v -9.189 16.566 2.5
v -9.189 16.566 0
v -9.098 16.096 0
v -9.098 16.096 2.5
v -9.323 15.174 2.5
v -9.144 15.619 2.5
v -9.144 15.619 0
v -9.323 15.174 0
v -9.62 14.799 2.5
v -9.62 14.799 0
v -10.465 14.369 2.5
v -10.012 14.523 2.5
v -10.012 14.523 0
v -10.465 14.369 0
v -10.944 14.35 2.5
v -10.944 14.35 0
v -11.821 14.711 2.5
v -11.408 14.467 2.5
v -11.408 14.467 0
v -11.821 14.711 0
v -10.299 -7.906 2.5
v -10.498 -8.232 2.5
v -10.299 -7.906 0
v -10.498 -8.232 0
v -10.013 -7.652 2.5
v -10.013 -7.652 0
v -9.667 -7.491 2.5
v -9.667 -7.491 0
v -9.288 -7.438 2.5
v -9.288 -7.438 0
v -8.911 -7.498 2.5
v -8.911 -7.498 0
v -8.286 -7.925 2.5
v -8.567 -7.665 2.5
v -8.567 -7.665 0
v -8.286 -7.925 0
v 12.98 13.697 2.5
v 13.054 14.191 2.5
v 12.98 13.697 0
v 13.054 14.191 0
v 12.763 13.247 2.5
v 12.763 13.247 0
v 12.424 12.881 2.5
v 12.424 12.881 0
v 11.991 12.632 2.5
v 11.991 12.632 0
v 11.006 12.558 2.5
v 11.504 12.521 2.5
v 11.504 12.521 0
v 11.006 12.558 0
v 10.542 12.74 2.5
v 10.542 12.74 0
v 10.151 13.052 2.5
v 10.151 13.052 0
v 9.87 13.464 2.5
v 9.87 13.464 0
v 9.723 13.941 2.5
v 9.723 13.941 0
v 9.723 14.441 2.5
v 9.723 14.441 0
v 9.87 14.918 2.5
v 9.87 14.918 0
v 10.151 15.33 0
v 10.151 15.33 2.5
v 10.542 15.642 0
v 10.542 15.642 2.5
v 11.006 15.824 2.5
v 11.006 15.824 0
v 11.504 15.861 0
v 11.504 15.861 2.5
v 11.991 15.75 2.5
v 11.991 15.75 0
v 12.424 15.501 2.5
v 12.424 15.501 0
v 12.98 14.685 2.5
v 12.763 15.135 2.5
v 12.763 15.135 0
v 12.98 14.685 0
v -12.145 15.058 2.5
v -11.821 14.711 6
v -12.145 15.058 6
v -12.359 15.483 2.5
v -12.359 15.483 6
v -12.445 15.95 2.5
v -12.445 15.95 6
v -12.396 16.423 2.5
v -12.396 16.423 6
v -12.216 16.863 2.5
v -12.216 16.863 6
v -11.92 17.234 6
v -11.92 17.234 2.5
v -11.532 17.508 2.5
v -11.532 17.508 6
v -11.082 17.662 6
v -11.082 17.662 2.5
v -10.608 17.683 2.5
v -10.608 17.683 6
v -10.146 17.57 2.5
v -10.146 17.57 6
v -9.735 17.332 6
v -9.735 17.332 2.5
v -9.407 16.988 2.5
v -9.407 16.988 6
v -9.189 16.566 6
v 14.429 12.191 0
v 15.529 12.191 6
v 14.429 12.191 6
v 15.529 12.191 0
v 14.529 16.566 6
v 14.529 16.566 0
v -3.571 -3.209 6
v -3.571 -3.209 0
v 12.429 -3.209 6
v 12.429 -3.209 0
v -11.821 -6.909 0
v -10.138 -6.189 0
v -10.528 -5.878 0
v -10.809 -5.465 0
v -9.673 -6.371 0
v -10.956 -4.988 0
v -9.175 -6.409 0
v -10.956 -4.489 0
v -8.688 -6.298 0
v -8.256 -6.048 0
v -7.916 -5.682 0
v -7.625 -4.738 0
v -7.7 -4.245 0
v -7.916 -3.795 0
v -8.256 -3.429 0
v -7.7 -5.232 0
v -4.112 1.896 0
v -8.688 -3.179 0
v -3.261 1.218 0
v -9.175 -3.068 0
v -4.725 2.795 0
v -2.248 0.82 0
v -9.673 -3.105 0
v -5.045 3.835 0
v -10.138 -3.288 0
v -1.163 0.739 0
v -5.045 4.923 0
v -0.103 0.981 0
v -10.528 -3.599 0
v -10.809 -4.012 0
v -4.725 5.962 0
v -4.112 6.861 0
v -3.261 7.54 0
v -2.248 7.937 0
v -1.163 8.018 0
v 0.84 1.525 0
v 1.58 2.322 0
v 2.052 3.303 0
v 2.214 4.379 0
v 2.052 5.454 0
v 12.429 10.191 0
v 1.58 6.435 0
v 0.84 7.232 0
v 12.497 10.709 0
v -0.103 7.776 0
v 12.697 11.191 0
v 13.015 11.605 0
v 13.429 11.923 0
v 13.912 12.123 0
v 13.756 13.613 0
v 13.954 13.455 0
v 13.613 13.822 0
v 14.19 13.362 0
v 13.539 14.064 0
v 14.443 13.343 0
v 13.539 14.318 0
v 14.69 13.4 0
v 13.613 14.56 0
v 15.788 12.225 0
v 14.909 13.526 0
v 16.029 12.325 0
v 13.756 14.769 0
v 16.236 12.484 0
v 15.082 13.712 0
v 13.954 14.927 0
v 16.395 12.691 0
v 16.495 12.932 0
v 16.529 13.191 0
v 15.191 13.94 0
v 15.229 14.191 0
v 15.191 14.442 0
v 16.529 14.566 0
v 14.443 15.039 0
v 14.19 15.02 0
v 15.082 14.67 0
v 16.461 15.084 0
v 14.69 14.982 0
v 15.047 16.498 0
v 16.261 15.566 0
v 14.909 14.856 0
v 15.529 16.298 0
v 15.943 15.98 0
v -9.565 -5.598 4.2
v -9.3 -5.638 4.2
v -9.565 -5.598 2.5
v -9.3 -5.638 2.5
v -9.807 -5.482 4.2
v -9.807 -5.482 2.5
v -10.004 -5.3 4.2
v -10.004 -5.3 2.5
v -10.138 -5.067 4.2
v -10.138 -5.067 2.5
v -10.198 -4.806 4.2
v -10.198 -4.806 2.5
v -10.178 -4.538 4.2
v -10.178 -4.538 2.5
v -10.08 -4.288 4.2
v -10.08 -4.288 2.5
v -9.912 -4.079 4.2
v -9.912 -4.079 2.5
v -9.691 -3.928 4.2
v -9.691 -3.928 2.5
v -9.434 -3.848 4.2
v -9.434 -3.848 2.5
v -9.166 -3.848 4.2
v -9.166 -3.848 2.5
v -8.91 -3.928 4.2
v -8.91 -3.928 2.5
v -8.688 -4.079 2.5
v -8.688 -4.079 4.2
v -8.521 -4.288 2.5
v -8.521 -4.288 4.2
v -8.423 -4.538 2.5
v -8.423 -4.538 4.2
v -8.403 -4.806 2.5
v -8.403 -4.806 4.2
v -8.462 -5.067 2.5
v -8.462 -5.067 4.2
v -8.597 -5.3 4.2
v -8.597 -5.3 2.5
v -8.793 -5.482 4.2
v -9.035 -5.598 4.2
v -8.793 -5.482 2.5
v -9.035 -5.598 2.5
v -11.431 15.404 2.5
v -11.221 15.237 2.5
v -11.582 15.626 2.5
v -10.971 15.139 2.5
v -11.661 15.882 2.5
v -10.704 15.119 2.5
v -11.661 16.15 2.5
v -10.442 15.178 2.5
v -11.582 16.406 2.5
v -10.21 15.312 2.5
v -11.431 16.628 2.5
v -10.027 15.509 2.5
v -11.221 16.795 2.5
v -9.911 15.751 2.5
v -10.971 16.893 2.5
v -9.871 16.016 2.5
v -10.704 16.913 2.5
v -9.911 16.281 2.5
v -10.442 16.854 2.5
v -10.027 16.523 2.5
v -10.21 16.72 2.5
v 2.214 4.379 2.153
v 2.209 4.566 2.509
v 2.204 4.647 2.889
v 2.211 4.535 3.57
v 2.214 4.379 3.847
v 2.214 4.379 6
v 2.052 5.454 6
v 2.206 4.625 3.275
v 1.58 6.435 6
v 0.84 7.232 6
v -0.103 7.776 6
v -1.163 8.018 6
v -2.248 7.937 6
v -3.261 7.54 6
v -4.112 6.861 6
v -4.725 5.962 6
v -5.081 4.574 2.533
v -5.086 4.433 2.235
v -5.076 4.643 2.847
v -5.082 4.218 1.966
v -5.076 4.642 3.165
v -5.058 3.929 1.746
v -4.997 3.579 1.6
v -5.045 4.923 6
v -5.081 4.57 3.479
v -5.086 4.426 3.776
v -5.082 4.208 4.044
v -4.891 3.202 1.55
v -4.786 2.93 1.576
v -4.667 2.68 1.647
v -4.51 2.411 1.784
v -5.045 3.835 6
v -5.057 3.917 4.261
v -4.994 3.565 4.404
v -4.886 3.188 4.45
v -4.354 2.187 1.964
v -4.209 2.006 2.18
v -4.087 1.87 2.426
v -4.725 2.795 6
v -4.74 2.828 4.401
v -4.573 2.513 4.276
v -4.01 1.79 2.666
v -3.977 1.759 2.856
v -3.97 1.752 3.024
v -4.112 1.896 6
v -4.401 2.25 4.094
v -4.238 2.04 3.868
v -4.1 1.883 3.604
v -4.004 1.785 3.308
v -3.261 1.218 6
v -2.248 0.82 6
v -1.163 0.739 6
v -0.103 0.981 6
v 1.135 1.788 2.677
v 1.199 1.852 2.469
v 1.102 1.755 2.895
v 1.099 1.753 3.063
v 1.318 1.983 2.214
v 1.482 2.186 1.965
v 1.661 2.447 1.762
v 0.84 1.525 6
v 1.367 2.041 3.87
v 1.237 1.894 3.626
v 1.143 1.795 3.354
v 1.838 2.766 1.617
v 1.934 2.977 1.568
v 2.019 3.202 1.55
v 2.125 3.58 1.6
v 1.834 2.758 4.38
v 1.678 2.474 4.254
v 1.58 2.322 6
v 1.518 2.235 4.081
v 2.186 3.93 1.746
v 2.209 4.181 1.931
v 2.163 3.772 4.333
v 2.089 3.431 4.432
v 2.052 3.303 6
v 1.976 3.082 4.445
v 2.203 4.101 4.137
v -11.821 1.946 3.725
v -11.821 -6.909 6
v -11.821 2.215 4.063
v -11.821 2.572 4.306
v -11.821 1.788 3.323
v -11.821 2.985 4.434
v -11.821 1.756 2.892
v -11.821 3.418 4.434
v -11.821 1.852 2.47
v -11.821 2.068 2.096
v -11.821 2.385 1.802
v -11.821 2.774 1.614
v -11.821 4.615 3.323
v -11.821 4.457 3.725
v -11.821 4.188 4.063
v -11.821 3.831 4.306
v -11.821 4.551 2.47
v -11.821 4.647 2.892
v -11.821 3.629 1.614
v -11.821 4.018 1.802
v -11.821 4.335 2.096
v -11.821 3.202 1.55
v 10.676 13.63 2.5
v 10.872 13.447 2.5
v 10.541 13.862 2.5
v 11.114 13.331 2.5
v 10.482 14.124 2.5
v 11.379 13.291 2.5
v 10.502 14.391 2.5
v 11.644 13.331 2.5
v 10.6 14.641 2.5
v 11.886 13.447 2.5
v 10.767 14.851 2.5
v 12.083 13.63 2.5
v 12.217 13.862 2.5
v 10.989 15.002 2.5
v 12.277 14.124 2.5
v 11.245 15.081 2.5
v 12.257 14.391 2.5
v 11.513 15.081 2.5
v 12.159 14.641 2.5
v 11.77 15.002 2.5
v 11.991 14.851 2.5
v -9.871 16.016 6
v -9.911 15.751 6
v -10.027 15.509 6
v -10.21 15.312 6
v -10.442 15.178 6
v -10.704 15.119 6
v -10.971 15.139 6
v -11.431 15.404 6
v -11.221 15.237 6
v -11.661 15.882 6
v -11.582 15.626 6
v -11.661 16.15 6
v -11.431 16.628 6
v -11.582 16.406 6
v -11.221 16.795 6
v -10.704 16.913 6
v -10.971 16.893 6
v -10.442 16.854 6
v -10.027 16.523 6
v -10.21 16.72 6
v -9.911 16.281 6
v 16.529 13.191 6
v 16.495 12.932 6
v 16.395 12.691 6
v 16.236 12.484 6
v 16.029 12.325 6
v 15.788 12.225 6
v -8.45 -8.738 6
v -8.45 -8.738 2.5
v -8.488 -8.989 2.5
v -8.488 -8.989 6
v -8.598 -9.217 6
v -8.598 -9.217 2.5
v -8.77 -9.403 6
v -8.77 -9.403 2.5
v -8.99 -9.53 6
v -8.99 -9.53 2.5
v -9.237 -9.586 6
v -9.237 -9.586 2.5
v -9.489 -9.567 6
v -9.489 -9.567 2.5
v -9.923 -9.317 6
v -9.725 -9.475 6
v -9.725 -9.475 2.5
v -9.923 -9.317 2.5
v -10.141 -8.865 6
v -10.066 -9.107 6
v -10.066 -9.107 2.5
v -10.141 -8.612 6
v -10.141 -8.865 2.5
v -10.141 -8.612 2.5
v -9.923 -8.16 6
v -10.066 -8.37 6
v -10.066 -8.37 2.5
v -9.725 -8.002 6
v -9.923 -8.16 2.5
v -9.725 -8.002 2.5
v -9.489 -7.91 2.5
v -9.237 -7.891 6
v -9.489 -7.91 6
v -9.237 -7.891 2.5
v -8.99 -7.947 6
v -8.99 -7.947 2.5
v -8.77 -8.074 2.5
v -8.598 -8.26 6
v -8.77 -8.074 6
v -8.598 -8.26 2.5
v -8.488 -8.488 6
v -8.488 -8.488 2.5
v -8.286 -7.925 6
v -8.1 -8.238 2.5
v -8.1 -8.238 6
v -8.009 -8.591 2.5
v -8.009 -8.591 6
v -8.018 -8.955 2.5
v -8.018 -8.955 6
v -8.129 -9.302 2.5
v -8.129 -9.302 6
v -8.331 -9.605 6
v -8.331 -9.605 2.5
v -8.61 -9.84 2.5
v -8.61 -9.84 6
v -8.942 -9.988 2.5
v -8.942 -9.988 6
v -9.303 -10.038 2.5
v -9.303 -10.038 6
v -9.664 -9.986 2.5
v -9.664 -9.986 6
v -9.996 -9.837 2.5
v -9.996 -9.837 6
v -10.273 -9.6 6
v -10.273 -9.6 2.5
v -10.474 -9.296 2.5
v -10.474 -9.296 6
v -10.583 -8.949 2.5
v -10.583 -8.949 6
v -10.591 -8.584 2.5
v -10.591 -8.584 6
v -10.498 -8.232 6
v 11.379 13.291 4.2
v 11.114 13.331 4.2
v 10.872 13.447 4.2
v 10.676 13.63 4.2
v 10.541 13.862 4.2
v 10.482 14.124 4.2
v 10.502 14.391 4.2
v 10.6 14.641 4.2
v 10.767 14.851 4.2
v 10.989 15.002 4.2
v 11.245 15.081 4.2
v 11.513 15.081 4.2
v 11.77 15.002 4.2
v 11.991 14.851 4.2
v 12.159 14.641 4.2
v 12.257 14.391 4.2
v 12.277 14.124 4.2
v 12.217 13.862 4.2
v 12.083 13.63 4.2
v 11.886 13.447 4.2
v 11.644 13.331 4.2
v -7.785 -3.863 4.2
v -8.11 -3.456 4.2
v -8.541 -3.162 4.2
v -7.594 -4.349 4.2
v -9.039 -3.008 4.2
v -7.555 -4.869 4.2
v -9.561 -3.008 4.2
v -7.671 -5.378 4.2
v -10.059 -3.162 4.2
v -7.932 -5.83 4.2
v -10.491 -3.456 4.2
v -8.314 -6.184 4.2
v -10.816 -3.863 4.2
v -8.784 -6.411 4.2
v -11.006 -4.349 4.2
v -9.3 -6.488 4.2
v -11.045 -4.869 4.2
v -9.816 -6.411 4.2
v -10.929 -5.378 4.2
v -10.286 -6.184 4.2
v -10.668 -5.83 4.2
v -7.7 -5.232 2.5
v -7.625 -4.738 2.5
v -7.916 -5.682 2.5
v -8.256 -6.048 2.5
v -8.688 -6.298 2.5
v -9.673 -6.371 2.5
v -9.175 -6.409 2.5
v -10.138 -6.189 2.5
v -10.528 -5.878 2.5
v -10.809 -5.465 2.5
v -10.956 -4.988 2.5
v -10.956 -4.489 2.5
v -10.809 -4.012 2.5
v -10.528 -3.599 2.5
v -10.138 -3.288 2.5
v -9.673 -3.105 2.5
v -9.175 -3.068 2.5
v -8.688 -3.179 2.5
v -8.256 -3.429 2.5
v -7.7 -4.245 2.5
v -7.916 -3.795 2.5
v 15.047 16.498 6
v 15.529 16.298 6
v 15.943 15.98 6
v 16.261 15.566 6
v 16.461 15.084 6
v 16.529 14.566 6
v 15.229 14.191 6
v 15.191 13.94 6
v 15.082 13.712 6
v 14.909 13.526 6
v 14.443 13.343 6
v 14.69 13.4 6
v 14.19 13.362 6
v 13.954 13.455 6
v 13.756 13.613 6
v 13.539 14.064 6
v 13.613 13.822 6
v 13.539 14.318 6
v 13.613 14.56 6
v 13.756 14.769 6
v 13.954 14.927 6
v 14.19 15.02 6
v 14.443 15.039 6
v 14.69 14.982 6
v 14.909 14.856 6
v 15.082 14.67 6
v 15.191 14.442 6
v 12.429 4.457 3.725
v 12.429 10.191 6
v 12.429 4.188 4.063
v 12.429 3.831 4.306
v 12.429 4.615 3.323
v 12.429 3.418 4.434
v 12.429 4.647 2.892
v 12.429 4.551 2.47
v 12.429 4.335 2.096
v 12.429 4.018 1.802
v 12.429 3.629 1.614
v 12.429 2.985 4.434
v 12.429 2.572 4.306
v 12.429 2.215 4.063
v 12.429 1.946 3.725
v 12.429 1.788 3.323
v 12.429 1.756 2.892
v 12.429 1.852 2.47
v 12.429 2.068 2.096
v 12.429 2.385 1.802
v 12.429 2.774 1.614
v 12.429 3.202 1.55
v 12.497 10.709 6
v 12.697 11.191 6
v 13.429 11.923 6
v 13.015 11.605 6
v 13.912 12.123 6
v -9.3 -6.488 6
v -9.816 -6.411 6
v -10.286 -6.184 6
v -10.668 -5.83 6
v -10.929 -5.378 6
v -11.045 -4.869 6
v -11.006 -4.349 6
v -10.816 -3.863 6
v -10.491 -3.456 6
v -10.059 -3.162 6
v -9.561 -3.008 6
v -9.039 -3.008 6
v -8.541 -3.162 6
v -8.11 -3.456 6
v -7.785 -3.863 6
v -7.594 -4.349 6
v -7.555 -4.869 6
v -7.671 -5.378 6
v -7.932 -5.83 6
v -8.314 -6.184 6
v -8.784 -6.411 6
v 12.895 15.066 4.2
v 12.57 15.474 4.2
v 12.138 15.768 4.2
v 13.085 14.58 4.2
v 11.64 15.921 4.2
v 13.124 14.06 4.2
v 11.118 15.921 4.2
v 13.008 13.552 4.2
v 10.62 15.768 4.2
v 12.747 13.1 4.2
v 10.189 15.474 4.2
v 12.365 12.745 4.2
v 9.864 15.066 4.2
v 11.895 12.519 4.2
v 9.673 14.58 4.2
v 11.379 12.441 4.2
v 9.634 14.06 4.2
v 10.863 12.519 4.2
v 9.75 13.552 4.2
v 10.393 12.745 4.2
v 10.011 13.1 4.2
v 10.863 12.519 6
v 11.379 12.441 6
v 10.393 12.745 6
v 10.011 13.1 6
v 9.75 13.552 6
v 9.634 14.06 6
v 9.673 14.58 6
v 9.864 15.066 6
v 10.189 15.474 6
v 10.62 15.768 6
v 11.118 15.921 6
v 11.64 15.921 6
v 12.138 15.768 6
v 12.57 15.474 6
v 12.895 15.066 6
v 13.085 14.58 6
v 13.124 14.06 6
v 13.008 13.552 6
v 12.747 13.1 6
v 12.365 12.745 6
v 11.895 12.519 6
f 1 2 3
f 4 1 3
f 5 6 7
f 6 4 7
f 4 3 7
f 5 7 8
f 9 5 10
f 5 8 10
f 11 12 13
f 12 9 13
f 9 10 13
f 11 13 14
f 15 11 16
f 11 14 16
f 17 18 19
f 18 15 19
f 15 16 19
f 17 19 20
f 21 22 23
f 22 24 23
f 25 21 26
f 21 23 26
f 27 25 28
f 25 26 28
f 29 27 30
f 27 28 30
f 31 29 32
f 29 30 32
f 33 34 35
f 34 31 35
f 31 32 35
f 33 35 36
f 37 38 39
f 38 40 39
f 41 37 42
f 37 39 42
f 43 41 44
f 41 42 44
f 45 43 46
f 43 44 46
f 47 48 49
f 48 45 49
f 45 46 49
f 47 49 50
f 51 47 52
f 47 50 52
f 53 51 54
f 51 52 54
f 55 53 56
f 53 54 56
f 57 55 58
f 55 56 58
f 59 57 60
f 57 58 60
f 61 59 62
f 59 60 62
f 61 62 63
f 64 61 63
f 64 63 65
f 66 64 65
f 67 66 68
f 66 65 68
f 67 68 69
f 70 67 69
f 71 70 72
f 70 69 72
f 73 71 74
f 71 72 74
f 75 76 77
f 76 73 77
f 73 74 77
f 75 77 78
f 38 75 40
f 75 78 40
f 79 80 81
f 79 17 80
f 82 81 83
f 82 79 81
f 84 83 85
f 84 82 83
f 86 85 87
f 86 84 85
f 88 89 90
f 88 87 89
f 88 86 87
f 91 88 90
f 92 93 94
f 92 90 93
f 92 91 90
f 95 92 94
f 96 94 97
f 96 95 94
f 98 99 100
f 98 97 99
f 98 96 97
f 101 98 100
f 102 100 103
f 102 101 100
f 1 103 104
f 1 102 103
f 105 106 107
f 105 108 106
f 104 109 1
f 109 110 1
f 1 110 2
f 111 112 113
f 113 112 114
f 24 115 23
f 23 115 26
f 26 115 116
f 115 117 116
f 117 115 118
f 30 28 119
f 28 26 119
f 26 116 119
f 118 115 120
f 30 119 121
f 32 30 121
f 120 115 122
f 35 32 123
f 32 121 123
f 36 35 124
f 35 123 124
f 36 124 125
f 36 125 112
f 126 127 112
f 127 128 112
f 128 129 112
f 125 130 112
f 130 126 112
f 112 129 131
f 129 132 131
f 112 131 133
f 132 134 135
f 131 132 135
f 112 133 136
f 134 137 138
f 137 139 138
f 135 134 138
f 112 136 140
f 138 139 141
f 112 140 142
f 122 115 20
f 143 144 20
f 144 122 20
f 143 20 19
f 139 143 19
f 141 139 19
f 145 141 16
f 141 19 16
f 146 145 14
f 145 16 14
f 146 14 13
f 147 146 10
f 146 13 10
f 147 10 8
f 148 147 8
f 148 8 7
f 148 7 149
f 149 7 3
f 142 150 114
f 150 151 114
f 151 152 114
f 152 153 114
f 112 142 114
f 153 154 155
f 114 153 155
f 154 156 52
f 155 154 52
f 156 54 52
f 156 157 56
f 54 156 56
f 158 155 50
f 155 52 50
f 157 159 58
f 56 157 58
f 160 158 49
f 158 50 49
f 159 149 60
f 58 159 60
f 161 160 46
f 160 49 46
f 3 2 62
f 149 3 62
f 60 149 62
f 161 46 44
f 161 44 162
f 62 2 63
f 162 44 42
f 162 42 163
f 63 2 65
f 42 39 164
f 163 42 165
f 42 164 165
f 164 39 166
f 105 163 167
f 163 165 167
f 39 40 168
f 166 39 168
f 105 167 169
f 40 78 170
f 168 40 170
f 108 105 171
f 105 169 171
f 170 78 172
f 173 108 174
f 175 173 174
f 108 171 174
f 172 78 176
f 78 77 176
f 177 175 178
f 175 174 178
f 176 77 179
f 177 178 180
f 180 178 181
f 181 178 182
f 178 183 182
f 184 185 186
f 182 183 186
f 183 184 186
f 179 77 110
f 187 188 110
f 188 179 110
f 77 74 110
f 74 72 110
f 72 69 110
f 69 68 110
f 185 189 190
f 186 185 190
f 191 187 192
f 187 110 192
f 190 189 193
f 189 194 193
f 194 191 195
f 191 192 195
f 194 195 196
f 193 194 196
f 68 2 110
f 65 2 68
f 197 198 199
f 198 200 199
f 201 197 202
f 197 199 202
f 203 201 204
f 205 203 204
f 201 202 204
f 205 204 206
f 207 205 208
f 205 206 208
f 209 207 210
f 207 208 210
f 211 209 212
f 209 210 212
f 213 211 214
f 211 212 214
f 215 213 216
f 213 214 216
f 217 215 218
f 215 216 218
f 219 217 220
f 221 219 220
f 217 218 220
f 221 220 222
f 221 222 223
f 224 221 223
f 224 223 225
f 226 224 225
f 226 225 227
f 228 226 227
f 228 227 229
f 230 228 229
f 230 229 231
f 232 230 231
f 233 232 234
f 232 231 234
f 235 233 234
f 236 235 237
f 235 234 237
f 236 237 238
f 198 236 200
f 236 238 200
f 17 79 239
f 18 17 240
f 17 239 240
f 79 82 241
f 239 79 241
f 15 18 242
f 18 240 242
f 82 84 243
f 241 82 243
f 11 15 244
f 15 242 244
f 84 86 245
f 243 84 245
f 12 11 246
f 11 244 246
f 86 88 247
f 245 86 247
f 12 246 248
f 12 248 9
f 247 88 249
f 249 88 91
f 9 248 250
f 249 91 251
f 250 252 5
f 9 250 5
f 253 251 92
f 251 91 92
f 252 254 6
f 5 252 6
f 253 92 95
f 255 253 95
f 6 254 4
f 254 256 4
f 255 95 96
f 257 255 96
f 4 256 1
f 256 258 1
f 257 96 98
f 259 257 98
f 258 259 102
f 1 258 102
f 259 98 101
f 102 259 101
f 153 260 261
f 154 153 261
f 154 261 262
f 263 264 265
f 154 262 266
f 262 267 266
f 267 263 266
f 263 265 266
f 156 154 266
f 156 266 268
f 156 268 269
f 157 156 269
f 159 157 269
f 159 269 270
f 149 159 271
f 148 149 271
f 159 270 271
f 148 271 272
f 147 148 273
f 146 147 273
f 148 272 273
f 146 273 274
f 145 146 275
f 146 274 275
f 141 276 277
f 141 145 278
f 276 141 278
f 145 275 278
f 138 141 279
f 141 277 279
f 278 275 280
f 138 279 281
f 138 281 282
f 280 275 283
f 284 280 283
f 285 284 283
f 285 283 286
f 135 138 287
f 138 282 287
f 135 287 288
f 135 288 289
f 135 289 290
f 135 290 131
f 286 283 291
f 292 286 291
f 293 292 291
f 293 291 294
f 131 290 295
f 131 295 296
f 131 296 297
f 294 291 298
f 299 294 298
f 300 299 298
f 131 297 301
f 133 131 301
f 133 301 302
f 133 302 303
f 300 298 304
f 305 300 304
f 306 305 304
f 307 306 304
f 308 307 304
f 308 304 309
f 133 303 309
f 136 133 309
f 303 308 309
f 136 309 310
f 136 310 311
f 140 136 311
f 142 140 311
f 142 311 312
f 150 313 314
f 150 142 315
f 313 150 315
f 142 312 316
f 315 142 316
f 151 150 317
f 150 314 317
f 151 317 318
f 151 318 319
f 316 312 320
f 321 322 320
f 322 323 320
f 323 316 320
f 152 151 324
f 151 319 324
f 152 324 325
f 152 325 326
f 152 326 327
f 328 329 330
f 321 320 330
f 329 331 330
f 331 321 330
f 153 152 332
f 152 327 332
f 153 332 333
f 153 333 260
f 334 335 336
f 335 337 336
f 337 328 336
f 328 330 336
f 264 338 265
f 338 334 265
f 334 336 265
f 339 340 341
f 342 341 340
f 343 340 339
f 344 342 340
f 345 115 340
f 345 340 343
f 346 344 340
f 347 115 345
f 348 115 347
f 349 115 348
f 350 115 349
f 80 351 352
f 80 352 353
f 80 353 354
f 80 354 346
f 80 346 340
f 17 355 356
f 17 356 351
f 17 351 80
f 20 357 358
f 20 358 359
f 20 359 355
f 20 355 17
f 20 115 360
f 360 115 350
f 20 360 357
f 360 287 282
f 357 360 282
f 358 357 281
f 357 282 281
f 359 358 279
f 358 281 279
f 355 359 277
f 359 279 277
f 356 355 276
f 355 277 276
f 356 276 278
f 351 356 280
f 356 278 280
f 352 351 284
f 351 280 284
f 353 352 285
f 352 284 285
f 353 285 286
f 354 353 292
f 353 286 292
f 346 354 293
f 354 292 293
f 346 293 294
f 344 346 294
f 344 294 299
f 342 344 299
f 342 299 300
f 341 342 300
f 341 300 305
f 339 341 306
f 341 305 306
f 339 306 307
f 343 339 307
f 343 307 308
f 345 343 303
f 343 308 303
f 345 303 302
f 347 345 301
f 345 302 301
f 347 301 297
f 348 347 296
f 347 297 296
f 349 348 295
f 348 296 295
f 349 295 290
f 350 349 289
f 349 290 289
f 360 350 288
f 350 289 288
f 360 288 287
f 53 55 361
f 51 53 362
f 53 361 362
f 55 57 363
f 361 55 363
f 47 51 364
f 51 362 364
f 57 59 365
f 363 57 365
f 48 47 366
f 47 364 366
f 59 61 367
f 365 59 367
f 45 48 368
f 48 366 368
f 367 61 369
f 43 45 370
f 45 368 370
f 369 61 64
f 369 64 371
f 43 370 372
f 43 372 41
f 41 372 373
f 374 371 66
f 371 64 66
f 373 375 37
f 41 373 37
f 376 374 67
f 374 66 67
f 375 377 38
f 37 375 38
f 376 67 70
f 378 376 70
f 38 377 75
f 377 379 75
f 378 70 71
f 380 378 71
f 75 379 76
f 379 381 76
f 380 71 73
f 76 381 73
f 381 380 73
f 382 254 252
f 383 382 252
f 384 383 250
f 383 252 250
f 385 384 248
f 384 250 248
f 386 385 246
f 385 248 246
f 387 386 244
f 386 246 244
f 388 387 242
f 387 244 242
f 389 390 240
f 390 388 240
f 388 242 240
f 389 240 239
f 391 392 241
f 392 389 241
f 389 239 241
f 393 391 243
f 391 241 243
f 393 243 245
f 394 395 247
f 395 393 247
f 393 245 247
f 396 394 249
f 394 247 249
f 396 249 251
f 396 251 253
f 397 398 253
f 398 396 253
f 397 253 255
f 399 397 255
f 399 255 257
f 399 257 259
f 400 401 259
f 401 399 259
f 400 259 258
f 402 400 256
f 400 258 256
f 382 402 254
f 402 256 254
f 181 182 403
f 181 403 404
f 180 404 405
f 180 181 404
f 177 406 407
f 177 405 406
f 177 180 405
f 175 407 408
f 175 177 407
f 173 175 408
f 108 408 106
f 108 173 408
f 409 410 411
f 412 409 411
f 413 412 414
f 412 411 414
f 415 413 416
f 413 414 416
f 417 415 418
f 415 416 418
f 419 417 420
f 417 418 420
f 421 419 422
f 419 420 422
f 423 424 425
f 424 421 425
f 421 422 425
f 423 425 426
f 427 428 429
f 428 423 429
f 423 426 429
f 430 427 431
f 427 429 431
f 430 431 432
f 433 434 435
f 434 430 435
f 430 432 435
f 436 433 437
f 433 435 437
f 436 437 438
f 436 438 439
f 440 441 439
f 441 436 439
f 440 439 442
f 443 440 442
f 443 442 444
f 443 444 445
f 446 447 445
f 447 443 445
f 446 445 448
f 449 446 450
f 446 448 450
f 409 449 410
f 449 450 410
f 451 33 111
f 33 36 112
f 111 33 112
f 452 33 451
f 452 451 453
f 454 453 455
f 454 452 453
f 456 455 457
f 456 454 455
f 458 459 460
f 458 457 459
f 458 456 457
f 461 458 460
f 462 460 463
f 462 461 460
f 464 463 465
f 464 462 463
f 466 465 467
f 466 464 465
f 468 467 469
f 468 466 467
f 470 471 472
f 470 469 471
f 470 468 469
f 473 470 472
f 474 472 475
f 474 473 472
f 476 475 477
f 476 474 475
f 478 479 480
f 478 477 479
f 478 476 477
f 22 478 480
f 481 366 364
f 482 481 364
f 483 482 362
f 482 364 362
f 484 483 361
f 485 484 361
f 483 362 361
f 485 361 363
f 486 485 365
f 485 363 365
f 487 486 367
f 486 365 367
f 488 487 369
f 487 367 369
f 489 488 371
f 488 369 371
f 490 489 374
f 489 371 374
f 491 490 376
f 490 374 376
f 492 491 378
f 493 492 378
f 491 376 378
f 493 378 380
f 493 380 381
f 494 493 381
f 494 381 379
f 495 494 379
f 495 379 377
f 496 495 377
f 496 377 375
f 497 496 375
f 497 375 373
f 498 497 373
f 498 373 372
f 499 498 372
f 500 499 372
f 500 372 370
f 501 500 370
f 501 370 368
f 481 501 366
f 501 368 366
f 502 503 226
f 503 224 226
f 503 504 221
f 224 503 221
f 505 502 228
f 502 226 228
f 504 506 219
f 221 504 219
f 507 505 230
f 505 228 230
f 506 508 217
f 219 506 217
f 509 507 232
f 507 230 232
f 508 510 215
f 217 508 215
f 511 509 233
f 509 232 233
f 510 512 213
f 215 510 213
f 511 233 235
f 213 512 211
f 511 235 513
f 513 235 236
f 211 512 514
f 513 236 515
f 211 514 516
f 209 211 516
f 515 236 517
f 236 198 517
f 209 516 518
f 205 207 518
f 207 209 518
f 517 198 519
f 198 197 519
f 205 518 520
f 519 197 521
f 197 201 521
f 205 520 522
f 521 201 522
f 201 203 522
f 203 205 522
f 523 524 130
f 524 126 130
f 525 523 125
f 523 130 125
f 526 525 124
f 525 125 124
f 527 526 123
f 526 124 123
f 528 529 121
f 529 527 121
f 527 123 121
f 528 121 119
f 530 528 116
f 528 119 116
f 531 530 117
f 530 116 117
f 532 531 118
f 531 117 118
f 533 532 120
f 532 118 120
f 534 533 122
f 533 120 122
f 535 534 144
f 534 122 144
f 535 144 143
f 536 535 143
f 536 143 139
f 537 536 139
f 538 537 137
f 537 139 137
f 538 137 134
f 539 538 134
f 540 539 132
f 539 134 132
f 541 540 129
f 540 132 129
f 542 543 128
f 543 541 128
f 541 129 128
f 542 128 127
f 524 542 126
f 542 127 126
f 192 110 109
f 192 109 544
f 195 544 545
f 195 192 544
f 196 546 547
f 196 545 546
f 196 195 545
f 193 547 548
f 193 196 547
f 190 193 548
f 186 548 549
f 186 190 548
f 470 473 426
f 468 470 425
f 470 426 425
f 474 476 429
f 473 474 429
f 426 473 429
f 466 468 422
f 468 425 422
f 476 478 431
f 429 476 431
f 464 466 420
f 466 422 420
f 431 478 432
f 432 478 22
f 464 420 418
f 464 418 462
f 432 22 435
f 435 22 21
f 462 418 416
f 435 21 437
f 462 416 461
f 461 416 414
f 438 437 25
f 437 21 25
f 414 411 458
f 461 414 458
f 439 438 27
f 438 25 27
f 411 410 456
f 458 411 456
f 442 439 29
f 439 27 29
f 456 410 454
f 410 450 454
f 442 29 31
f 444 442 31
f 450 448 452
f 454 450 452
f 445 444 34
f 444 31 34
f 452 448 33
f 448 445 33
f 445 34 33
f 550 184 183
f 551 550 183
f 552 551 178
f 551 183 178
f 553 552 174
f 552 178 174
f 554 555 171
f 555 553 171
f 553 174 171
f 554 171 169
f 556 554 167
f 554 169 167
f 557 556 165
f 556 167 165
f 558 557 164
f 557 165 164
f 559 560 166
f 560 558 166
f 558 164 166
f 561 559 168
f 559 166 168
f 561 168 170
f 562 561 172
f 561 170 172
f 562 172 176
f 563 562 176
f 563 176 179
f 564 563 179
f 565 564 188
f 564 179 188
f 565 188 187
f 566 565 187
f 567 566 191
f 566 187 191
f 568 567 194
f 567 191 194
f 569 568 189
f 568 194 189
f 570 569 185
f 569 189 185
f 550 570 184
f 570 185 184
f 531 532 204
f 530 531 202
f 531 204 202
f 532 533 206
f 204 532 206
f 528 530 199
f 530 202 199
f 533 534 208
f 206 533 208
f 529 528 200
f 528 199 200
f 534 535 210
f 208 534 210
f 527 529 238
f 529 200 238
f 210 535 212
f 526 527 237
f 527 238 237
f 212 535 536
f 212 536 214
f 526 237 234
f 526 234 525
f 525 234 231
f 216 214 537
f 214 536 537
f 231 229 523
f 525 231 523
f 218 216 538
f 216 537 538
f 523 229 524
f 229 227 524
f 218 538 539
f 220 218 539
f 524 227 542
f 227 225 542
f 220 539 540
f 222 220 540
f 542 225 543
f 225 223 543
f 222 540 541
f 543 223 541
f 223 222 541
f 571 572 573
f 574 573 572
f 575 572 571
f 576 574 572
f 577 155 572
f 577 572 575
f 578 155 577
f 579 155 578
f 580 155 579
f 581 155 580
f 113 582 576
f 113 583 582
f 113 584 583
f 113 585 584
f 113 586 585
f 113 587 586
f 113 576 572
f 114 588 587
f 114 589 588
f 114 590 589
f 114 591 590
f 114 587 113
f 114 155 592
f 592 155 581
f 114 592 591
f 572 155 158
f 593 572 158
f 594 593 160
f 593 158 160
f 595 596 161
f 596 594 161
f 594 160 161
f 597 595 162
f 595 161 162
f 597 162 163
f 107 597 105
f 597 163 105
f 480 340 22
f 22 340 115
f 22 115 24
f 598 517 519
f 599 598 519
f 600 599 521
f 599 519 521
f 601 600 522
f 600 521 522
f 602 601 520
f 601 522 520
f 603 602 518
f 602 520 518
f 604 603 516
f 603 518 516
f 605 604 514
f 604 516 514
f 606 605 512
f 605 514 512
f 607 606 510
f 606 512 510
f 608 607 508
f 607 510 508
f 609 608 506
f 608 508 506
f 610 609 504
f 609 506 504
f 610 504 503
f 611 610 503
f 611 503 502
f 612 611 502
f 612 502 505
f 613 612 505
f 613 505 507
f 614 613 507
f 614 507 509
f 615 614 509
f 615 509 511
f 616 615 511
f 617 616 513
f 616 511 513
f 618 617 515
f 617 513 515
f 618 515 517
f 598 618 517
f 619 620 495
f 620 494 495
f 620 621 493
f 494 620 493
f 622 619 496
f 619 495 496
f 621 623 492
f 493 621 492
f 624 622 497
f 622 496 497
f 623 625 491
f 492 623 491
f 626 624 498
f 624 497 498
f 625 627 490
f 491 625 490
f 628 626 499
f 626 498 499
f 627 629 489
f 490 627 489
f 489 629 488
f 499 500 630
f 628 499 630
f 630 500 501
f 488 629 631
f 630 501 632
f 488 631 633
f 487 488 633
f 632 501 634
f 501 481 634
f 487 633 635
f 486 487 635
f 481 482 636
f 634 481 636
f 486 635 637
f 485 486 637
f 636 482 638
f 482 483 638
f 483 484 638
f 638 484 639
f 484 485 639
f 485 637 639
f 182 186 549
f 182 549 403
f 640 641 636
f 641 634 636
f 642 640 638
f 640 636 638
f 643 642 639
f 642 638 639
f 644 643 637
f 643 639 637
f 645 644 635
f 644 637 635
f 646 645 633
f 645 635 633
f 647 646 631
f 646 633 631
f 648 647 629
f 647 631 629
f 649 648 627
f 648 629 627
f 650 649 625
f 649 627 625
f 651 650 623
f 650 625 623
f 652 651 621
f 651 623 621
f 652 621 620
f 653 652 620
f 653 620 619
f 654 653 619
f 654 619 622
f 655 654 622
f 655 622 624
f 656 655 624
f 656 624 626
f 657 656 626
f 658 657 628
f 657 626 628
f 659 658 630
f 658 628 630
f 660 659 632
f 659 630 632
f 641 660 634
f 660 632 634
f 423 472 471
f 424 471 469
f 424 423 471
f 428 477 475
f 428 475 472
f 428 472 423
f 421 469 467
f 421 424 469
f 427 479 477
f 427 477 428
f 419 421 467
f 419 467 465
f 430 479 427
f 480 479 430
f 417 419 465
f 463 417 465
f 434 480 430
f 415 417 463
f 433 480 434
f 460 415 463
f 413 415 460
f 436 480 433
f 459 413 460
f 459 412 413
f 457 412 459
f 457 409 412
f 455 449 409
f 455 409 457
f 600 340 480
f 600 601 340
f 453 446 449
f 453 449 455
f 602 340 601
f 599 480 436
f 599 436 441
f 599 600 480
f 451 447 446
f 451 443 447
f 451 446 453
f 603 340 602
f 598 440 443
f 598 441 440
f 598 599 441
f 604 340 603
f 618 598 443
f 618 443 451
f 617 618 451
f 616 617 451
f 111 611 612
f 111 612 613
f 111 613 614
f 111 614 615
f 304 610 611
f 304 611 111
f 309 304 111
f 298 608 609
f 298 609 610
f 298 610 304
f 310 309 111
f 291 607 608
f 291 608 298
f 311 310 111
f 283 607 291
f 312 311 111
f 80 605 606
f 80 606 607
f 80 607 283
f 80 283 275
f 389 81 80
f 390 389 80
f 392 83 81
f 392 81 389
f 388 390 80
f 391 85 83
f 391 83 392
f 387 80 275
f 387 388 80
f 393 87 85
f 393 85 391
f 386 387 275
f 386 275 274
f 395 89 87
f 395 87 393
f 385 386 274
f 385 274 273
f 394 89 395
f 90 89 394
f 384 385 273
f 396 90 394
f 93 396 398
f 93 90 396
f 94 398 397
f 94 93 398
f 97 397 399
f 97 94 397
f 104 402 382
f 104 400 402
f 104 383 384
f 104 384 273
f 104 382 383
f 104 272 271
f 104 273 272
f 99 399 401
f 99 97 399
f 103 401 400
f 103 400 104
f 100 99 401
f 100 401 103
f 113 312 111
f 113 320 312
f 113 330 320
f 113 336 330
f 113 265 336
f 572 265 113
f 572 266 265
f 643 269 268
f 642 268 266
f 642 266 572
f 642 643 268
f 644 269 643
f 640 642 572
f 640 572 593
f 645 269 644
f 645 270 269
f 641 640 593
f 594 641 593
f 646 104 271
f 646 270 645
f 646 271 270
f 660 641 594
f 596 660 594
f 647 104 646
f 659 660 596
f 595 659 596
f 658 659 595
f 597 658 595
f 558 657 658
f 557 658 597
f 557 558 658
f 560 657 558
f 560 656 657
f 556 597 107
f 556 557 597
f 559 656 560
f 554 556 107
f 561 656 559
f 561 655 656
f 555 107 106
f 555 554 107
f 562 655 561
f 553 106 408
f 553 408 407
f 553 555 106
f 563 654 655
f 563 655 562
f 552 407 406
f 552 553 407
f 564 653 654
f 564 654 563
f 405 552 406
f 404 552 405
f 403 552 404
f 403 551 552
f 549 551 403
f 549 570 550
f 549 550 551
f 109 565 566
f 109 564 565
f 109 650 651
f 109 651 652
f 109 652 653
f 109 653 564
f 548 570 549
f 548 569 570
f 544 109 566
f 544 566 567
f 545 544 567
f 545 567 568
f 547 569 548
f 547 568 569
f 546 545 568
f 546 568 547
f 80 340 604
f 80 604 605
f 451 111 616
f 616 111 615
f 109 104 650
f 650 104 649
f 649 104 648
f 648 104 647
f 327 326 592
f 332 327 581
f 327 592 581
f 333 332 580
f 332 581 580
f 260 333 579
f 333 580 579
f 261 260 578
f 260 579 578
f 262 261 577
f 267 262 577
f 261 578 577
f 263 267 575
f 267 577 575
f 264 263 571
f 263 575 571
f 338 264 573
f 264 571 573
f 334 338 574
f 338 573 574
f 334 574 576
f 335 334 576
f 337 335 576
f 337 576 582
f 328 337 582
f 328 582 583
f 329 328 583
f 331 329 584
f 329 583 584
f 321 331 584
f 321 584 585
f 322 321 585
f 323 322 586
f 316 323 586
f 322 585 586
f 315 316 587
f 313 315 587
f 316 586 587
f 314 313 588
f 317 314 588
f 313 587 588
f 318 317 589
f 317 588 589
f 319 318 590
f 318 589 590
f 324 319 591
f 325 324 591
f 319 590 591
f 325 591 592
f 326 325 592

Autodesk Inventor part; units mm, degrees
ref_plane "YZ Plane" through (0, 0, 0) normal (1, 0, 0) x (0, 1, 0)
ref_plane "XZ Plane" through (0, 0, 0) normal (0, 1, 0) x (-1, 0, 0)
sketch "Skizze1" plane through (0, 0, 0) normal (0, 0, 1) x (1, 0, 0)
  line L0 (14.1792, -17.284) -> (14.1792, 17.716)
  line L1 (14.1792, 17.716) -> (-11.8208, 17.716)
  line L2 (-11.8208, 17.716) -> (-11.8208, -17.284)
  line L3 (-11.8208, -17.284) -> (14.1792, -17.284)
  line L4 (14.1792, -17.284) -> (-11.8208, 17.716) construction
  line L5 (14.1792, 17.716) -> (-11.8208, -17.284) construction
  line L6 (3.4292, 10.341) -> (-6.0708, 10.341) construction
  line L7 (3.4292, 3.091) -> (3.4292, 10.341) construction
  line L8 (-6.0708, 3.091) -> (3.4292, 3.091) construction
  line L9 (-6.0708, 10.341) -> (-6.0708, 3.091) construction
  line L10 (3.4292, 10.341) -> (-6.0708, 3.091) construction
  line L11 (3.4292, 3.091) -> (-6.0708, 10.341) construction
  point P0 (0, 0)
  point P1 (1.1792, 0.216)
  point P2 (1.1792, 0.216)
  point P3 (-1.3208, 6.716)
  point P4 (-1.3208, 6.716)
  point P5 (1.1792, 0.216)
  point P6 (-1.3208, 6.716)
  dimension "d0" = 26
  dimension "d1" = 35
  dimension "d2" = 11
  dimension "d3" = 2.5
sketch "Skizze2" plane through (0, 0, 0) normal (0, 0, 1) x (1, 0, 0)
  line L0 (-3.4208, 1.091) -> (-7.8208, 1.091) projected
  line L1 (-7.8208, 1.091) -> (-7.8208, 12.341) projected
  line L2 (-7.8208, 12.341) -> (-3.4208, 12.341) projected
  line L3 (5.1792, 1.091) -> (0.7792, 1.091) projected
  line L4 (5.1792, 12.341) -> (5.1792, 1.091) projected
  line L5 (0.7792, 12.341) -> (5.1792, 12.341) projected
  circle A0 centre (-9.3002, -4.7384) radius 1.575 construction
  circle A1 centre (11.3792, 14.191) radius 1.575 construction
  circle A2 centre (-9.3002, -4.7384) radius 0.7 construction
  circle A3 centre (-10.7708, 16.016) radius 0.7 construction
  circle A4 centre (11.3792, 14.191) radius 0.7 construction
  line L6 (-3.4208, 12.341) -> (-3.4208, 13.366) projected
  line L7 (-3.4208, 13.366) -> (0.7792, 13.366) projected
  line L8 (0.7792, 0.066) -> (-3.4208, 0.066) projected
  line L9 (-3.4208, 0.066) -> (-3.4208, 1.091) projected
  line L10 (0.7792, 1.091) -> (0.7792, 0.066) projected
  line L11 (0.7792, 13.366) -> (0.7792, 12.341) projected
  line L12 (-12.2708, -9.259) -> (-12.2708, 10.741) construction
  line L13 (14.5292, 16.566) -> (-9.295, 16.566) construction
  arc A5 (16.5292, 14.566) -> (14.5292, 16.566) centre (14.5292, 14.566) ccw projected
  line L14 (16.5292, 14.566) -> (16.5292, 13.191) projected
  arc A6 (15.5292, 12.191) -> (16.5292, 13.191) centre (15.5292, 13.191) ccw projected
  line L15 (15.5292, 12.191) -> (14.4292, 12.191) projected
  arc A7 (14.4292, 12.191) -> (12.4292, 10.191) centre (14.4292, 10.191) ccw projected
  line L16 (12.4292, 10.191) -> (12.4292, -3.209) projected
  line L17 (-3.5708, -3.209) -> (12.4292, -3.209) projected
  line L18 (-8.1002, -7.7384) -> (-3.5708, -3.209) projected
  arc A8 (-10.7708, 17.591) -> (-9.295, 16.566) centre (-10.7708, 16.016) ccw construction
  line L19 (-8.1002, -8.7384) -> (-8.1002, -7.7384) construction
  circle A9 centre (-9.3002, -8.7384) radius 0.75 construction
  circle A10 centre (-9.3002, -8.7384) radius 1.2 construction
  line L20 (-10.8208, -7.909) -> (-11.8208, -6.909) construction
  line L21 (-11.8208, -6.909) -> (-11.8208, 14.7109)
  line L22 (-11.8208, -6.909) -> (-10.4976, -8.2322)
  arc A11 (-8.1002, -8.2384) -> (-8.2864, -7.9246) centre (-9.3002, -8.7384) ccw construction
  line L23 (-8.1002, -8.2384) -> (-8.1002, -7.7384) construction
  circle A12 centre (-9.3002, -4.7384) radius 1.675
  circle A13 centre (11.3792, 14.191) radius 1.675
  line L24 (14.5292, 16.566) -> (-9.1887, 16.566)
  arc A14 (-11.8208, 14.7109) -> (-9.1887, 16.566) centre (-10.7708, 16.016) ccw
  circle A15 centre (14.3792, 14.191) radius 0.75 construction
  circle A16 centre (14.3792, 14.191) radius 0.85
  line L25 (-8.1002, -7.7384) -> (-8.2864, -7.9246)
  arc A17 (-8.2864, -7.9246) -> (-10.4976, -8.2322) centre (-9.3002, -8.7384) ccw
  point P0 (0, 0)
  dimension "d4" = 0.1
  dimension "d5" = 0.1
  dimension "d6" = 0.1
  dimension "d7" = 0.1
  dimension "d10" = 0.1
extrude "Extrusion1" add sketch "Skizze2" along normal blind 2.5
sketch "Skizze3" plane through (0, 0, 2.5) normal (0, 0, 1) x (1, 0, 0)
  line L0 (-7.8208, 1.091) -> (-7.8208, 12.341) projected
  line L1 (-7.8208, 12.341) -> (-3.4208, 12.341) projected
  line L2 (-3.4208, 12.341) -> (-3.4208, 13.366) projected
  line L3 (-3.4208, 13.366) -> (0.7792, 13.366) projected
  line L4 (0.7792, 13.366) -> (0.7792, 12.341) projected
  line L5 (0.7792, 12.341) -> (5.1792, 12.341) projected
  line L6 (5.1792, 12.341) -> (5.1792, 1.091) projected
  line L7 (5.1792, 1.091) -> (0.7792, 1.091) projected
  line L8 (0.7792, 1.091) -> (0.7792, 0.066) projected
  line L9 (0.7792, 0.066) -> (-3.4208, 0.066) projected
  line L10 (-3.4208, 0.066) -> (-3.4208, 1.091) projected
  line L11 (-3.4208, 1.091) -> (-7.8208, 1.091) projected
  circle A0 centre (11.3792, 14.191) radius 1.675 construction
  circle A1 centre (-9.3002, -4.7384) radius 1.675 construction
  circle A2 centre (14.3792, 14.191) radius 0.85 projected
  arc A3 (16.5292, 14.566) -> (14.5292, 16.566) centre (14.5292, 14.566) ccw projected
  line L12 (14.5292, 16.566) -> (-9.1887, 16.566) projected
  arc A4 (-11.8208, 14.7109) -> (-9.1887, 16.566) centre (-10.7708, 16.016) ccw construction
  line L13 (-11.8208, 14.7109) -> (-11.8208, -6.909) projected
  line L14 (-11.8208, -6.909) -> (-10.4976, -8.2322) projected
  line L15 (-8.2864, -7.9246) -> (-3.5708, -3.209) projected
  line L16 (-3.5708, -3.209) -> (12.4292, -3.209) projected
  line L17 (12.4292, -3.209) -> (12.4292, 10.191) projected
  arc A5 (14.4292, 12.191) -> (12.4292, 10.191) centre (14.4292, 10.191) ccw projected
  line L18 (14.4292, 12.191) -> (15.5292, 12.191) projected
  arc A6 (15.5292, 12.191) -> (16.5292, 13.191) centre (15.5292, 13.191) ccw projected
  line L19 (16.5292, 13.191) -> (16.5292, 14.566) projected
  circle A7 centre (11.3792, 14.191) radius 0.7 construction
  circle A8 centre (-9.3002, -4.7384) radius 0.7 construction
  circle A9 centre (-9.3002, -8.7384) radius 0.75 construction
  arc A10 (-8.2864, -7.9246) -> (-10.4976, -8.2322) centre (-9.3002, -8.7384) ccw construction
  circle A11 centre (-9.3002, -8.7384) radius 0.85
  line L20 (-8.2864, -7.9246) -> (-3.5708, -3.209) projected
  arc A12 (-10.4976, -8.2322) -> (-8.2864, -7.9246) centre (-9.3002, -8.7384) ccw
  arc A13 (-9.1887, 16.566) -> (-11.8208, 14.7109) centre (-10.7708, 16.016) ccw
  circle A14 centre (-10.7708, 16.016) radius 0.7 construction
  circle A15 centre (-10.7708, 16.016) radius 0.9
  circle A16 centre (11.3792, 14.191) radius 0.9
  circle A17 centre (-9.3002, -4.7384) radius 0.9
  point P0 (0, 0)
  dimension "d11" = 0.1
  dimension "d13" = 1.8
  dimension "d14" = 1.8
  dimension "d15" = 1.8
ref_plane "Arbeitsebene1" through (-9.7716, -9.2098, 6) normal (0, 0, 1) x (1, 0, 0)
extrude "Extrusion2" add sketch "Skizze3" along normal up to surface (3.5 mm away) contours L19 A6 L18 A5 L17 L16 L15 A12 L14 L13 A13 L12 A3 | A16 | A17
sketch "Skizze4" plane through (-9.1887, 16.566, 6) normal (0, 0, 1) x (1, 0, 0)
  circle A0 centre (-0.1115, -21.3043) radius 0.7 construction
  circle A1 centre (-1.5821, -0.55) radius 0.7 construction
  circle A2 centre (20.5679, -2.375) radius 0.7 construction
  point P0 (9.1887, -16.566)
hole "Bohrung1" at (-9.3002, -4.7384, 6) at (11.3792, 14.191, 6) direction (0, 0, -1) diameter 1.8 end through all counterbore diameter 3.5 counterbore depth 1.8 clearance for "Inbusschraube ISO 4762" size "M1.6" standard "ISO"
sketch "Sketch5" plane through (-9.1887, 16.566, 6) normal (0, 0, 1) x (1, 0, 0)
  circle A0 centre (7.7527, -12.1874) radius 3.65
  circle A1 centre (-0.1115, -21.3043) radius 1.75 projected
  circle A2 centre (20.5679, -2.375) radius 1.75 projected
  line L0 (25.7179, -2) -> (25.7179, -3.375) projected
  arc A3 (25.7179, -2) -> (23.7179, 0) centre (23.7179, -2) ccw projected
  line L1 (0, 0) -> (23.7179, 0) projected
  arc A4 (0, 0) -> (-2.6321, -1.855) centre (-1.5821, -0.55) ccw projected
  line L2 (-2.6321, -23.475) -> (-2.6321, -1.855) projected
  line L3 (-1.3089, -24.7982) -> (-2.6321, -23.475) projected
  arc A5 (-1.3089, -24.7982) -> (0.9023, -24.4906) centre (-0.1115, -25.3043) ccw projected
  line L4 (5.6179, -19.775) -> (0.9023, -24.4906) projected
  line L5 (21.6179, -19.775) -> (5.6179, -19.775) projected
  line L6 (21.6179, -6.375) -> (21.6179, -19.775) projected
  arc A6 (23.6179, -4.375) -> (21.6179, -6.375) centre (23.6179, -6.375) ccw projected
  line L7 (24.7179, -4.375) -> (23.6179, -4.375) projected
  arc A7 (24.7179, -4.375) -> (25.7179, -3.375) centre (24.7179, -3.375) ccw projected
  circle A8 centre (23.5679, -2.375) radius 0.85 projected
  circle A9 centre (-0.1115, -25.3043) radius 0.85 projected
  circle A10 centre (-1.5821, -0.55) radius 0.9 projected
  line L8 (5.7679, -4.225) -> (1.3679, -4.225) projected
  line L9 (5.7679, -3.2) -> (5.7679, -4.225) projected
  line L10 (9.9679, -3.2) -> (5.7679, -3.2) projected
  line L11 (9.9679, -4.225) -> (9.9679, -3.2) projected
  line L12 (14.3679, -4.225) -> (9.9679, -4.225) projected
  line L13 (14.3679, -15.475) -> (14.3679, -4.225) projected
  line L14 (9.9679, -15.475) -> (14.3679, -15.475) projected
  line L15 (9.9679, -16.5) -> (9.9679, -15.475) projected
  line L16 (5.7679, -16.5) -> (9.9679, -16.5) projected
  line L17 (5.7679, -15.475) -> (5.7679, -16.5) projected
  line L18 (1.3679, -15.475) -> (5.7679, -15.475) projected
  line L19 (1.3679, -4.225) -> (1.3679, -15.475) projected
  point P0 (9.1887, -16.566)
  dimension "d25" = 7.3
extrude "Extrusion3" add sketch "Sketch5" against normal up to surface (6 mm away) contours L9 L10 L11 L12 L13 L14 L15 L16 L17 L18 L19 L8
sketch "Sketch6" plane through (12.4292, -3.209, 0) normal (1, 0, 0) x (0, 0, -1)
  line L0 (0, 13.4) -> (0, 0) projected
  line L1 (0, 13.4) -> (-6, 13.4) projected
  line L2 (-6, 13.4) -> (-6, 0) projected
  line L3 (0, 0) -> (-6, 0) projected
  circle A0 centre (-3, 6.4105) radius 1.45
  point P0 (0, 3.209)
  dimension "d28" = 2.9
extrude "Extrusion4" cut sketch "Sketch6" against normal through all contours A0
properties part number "110_Syrringeholder_XY_Stage"
